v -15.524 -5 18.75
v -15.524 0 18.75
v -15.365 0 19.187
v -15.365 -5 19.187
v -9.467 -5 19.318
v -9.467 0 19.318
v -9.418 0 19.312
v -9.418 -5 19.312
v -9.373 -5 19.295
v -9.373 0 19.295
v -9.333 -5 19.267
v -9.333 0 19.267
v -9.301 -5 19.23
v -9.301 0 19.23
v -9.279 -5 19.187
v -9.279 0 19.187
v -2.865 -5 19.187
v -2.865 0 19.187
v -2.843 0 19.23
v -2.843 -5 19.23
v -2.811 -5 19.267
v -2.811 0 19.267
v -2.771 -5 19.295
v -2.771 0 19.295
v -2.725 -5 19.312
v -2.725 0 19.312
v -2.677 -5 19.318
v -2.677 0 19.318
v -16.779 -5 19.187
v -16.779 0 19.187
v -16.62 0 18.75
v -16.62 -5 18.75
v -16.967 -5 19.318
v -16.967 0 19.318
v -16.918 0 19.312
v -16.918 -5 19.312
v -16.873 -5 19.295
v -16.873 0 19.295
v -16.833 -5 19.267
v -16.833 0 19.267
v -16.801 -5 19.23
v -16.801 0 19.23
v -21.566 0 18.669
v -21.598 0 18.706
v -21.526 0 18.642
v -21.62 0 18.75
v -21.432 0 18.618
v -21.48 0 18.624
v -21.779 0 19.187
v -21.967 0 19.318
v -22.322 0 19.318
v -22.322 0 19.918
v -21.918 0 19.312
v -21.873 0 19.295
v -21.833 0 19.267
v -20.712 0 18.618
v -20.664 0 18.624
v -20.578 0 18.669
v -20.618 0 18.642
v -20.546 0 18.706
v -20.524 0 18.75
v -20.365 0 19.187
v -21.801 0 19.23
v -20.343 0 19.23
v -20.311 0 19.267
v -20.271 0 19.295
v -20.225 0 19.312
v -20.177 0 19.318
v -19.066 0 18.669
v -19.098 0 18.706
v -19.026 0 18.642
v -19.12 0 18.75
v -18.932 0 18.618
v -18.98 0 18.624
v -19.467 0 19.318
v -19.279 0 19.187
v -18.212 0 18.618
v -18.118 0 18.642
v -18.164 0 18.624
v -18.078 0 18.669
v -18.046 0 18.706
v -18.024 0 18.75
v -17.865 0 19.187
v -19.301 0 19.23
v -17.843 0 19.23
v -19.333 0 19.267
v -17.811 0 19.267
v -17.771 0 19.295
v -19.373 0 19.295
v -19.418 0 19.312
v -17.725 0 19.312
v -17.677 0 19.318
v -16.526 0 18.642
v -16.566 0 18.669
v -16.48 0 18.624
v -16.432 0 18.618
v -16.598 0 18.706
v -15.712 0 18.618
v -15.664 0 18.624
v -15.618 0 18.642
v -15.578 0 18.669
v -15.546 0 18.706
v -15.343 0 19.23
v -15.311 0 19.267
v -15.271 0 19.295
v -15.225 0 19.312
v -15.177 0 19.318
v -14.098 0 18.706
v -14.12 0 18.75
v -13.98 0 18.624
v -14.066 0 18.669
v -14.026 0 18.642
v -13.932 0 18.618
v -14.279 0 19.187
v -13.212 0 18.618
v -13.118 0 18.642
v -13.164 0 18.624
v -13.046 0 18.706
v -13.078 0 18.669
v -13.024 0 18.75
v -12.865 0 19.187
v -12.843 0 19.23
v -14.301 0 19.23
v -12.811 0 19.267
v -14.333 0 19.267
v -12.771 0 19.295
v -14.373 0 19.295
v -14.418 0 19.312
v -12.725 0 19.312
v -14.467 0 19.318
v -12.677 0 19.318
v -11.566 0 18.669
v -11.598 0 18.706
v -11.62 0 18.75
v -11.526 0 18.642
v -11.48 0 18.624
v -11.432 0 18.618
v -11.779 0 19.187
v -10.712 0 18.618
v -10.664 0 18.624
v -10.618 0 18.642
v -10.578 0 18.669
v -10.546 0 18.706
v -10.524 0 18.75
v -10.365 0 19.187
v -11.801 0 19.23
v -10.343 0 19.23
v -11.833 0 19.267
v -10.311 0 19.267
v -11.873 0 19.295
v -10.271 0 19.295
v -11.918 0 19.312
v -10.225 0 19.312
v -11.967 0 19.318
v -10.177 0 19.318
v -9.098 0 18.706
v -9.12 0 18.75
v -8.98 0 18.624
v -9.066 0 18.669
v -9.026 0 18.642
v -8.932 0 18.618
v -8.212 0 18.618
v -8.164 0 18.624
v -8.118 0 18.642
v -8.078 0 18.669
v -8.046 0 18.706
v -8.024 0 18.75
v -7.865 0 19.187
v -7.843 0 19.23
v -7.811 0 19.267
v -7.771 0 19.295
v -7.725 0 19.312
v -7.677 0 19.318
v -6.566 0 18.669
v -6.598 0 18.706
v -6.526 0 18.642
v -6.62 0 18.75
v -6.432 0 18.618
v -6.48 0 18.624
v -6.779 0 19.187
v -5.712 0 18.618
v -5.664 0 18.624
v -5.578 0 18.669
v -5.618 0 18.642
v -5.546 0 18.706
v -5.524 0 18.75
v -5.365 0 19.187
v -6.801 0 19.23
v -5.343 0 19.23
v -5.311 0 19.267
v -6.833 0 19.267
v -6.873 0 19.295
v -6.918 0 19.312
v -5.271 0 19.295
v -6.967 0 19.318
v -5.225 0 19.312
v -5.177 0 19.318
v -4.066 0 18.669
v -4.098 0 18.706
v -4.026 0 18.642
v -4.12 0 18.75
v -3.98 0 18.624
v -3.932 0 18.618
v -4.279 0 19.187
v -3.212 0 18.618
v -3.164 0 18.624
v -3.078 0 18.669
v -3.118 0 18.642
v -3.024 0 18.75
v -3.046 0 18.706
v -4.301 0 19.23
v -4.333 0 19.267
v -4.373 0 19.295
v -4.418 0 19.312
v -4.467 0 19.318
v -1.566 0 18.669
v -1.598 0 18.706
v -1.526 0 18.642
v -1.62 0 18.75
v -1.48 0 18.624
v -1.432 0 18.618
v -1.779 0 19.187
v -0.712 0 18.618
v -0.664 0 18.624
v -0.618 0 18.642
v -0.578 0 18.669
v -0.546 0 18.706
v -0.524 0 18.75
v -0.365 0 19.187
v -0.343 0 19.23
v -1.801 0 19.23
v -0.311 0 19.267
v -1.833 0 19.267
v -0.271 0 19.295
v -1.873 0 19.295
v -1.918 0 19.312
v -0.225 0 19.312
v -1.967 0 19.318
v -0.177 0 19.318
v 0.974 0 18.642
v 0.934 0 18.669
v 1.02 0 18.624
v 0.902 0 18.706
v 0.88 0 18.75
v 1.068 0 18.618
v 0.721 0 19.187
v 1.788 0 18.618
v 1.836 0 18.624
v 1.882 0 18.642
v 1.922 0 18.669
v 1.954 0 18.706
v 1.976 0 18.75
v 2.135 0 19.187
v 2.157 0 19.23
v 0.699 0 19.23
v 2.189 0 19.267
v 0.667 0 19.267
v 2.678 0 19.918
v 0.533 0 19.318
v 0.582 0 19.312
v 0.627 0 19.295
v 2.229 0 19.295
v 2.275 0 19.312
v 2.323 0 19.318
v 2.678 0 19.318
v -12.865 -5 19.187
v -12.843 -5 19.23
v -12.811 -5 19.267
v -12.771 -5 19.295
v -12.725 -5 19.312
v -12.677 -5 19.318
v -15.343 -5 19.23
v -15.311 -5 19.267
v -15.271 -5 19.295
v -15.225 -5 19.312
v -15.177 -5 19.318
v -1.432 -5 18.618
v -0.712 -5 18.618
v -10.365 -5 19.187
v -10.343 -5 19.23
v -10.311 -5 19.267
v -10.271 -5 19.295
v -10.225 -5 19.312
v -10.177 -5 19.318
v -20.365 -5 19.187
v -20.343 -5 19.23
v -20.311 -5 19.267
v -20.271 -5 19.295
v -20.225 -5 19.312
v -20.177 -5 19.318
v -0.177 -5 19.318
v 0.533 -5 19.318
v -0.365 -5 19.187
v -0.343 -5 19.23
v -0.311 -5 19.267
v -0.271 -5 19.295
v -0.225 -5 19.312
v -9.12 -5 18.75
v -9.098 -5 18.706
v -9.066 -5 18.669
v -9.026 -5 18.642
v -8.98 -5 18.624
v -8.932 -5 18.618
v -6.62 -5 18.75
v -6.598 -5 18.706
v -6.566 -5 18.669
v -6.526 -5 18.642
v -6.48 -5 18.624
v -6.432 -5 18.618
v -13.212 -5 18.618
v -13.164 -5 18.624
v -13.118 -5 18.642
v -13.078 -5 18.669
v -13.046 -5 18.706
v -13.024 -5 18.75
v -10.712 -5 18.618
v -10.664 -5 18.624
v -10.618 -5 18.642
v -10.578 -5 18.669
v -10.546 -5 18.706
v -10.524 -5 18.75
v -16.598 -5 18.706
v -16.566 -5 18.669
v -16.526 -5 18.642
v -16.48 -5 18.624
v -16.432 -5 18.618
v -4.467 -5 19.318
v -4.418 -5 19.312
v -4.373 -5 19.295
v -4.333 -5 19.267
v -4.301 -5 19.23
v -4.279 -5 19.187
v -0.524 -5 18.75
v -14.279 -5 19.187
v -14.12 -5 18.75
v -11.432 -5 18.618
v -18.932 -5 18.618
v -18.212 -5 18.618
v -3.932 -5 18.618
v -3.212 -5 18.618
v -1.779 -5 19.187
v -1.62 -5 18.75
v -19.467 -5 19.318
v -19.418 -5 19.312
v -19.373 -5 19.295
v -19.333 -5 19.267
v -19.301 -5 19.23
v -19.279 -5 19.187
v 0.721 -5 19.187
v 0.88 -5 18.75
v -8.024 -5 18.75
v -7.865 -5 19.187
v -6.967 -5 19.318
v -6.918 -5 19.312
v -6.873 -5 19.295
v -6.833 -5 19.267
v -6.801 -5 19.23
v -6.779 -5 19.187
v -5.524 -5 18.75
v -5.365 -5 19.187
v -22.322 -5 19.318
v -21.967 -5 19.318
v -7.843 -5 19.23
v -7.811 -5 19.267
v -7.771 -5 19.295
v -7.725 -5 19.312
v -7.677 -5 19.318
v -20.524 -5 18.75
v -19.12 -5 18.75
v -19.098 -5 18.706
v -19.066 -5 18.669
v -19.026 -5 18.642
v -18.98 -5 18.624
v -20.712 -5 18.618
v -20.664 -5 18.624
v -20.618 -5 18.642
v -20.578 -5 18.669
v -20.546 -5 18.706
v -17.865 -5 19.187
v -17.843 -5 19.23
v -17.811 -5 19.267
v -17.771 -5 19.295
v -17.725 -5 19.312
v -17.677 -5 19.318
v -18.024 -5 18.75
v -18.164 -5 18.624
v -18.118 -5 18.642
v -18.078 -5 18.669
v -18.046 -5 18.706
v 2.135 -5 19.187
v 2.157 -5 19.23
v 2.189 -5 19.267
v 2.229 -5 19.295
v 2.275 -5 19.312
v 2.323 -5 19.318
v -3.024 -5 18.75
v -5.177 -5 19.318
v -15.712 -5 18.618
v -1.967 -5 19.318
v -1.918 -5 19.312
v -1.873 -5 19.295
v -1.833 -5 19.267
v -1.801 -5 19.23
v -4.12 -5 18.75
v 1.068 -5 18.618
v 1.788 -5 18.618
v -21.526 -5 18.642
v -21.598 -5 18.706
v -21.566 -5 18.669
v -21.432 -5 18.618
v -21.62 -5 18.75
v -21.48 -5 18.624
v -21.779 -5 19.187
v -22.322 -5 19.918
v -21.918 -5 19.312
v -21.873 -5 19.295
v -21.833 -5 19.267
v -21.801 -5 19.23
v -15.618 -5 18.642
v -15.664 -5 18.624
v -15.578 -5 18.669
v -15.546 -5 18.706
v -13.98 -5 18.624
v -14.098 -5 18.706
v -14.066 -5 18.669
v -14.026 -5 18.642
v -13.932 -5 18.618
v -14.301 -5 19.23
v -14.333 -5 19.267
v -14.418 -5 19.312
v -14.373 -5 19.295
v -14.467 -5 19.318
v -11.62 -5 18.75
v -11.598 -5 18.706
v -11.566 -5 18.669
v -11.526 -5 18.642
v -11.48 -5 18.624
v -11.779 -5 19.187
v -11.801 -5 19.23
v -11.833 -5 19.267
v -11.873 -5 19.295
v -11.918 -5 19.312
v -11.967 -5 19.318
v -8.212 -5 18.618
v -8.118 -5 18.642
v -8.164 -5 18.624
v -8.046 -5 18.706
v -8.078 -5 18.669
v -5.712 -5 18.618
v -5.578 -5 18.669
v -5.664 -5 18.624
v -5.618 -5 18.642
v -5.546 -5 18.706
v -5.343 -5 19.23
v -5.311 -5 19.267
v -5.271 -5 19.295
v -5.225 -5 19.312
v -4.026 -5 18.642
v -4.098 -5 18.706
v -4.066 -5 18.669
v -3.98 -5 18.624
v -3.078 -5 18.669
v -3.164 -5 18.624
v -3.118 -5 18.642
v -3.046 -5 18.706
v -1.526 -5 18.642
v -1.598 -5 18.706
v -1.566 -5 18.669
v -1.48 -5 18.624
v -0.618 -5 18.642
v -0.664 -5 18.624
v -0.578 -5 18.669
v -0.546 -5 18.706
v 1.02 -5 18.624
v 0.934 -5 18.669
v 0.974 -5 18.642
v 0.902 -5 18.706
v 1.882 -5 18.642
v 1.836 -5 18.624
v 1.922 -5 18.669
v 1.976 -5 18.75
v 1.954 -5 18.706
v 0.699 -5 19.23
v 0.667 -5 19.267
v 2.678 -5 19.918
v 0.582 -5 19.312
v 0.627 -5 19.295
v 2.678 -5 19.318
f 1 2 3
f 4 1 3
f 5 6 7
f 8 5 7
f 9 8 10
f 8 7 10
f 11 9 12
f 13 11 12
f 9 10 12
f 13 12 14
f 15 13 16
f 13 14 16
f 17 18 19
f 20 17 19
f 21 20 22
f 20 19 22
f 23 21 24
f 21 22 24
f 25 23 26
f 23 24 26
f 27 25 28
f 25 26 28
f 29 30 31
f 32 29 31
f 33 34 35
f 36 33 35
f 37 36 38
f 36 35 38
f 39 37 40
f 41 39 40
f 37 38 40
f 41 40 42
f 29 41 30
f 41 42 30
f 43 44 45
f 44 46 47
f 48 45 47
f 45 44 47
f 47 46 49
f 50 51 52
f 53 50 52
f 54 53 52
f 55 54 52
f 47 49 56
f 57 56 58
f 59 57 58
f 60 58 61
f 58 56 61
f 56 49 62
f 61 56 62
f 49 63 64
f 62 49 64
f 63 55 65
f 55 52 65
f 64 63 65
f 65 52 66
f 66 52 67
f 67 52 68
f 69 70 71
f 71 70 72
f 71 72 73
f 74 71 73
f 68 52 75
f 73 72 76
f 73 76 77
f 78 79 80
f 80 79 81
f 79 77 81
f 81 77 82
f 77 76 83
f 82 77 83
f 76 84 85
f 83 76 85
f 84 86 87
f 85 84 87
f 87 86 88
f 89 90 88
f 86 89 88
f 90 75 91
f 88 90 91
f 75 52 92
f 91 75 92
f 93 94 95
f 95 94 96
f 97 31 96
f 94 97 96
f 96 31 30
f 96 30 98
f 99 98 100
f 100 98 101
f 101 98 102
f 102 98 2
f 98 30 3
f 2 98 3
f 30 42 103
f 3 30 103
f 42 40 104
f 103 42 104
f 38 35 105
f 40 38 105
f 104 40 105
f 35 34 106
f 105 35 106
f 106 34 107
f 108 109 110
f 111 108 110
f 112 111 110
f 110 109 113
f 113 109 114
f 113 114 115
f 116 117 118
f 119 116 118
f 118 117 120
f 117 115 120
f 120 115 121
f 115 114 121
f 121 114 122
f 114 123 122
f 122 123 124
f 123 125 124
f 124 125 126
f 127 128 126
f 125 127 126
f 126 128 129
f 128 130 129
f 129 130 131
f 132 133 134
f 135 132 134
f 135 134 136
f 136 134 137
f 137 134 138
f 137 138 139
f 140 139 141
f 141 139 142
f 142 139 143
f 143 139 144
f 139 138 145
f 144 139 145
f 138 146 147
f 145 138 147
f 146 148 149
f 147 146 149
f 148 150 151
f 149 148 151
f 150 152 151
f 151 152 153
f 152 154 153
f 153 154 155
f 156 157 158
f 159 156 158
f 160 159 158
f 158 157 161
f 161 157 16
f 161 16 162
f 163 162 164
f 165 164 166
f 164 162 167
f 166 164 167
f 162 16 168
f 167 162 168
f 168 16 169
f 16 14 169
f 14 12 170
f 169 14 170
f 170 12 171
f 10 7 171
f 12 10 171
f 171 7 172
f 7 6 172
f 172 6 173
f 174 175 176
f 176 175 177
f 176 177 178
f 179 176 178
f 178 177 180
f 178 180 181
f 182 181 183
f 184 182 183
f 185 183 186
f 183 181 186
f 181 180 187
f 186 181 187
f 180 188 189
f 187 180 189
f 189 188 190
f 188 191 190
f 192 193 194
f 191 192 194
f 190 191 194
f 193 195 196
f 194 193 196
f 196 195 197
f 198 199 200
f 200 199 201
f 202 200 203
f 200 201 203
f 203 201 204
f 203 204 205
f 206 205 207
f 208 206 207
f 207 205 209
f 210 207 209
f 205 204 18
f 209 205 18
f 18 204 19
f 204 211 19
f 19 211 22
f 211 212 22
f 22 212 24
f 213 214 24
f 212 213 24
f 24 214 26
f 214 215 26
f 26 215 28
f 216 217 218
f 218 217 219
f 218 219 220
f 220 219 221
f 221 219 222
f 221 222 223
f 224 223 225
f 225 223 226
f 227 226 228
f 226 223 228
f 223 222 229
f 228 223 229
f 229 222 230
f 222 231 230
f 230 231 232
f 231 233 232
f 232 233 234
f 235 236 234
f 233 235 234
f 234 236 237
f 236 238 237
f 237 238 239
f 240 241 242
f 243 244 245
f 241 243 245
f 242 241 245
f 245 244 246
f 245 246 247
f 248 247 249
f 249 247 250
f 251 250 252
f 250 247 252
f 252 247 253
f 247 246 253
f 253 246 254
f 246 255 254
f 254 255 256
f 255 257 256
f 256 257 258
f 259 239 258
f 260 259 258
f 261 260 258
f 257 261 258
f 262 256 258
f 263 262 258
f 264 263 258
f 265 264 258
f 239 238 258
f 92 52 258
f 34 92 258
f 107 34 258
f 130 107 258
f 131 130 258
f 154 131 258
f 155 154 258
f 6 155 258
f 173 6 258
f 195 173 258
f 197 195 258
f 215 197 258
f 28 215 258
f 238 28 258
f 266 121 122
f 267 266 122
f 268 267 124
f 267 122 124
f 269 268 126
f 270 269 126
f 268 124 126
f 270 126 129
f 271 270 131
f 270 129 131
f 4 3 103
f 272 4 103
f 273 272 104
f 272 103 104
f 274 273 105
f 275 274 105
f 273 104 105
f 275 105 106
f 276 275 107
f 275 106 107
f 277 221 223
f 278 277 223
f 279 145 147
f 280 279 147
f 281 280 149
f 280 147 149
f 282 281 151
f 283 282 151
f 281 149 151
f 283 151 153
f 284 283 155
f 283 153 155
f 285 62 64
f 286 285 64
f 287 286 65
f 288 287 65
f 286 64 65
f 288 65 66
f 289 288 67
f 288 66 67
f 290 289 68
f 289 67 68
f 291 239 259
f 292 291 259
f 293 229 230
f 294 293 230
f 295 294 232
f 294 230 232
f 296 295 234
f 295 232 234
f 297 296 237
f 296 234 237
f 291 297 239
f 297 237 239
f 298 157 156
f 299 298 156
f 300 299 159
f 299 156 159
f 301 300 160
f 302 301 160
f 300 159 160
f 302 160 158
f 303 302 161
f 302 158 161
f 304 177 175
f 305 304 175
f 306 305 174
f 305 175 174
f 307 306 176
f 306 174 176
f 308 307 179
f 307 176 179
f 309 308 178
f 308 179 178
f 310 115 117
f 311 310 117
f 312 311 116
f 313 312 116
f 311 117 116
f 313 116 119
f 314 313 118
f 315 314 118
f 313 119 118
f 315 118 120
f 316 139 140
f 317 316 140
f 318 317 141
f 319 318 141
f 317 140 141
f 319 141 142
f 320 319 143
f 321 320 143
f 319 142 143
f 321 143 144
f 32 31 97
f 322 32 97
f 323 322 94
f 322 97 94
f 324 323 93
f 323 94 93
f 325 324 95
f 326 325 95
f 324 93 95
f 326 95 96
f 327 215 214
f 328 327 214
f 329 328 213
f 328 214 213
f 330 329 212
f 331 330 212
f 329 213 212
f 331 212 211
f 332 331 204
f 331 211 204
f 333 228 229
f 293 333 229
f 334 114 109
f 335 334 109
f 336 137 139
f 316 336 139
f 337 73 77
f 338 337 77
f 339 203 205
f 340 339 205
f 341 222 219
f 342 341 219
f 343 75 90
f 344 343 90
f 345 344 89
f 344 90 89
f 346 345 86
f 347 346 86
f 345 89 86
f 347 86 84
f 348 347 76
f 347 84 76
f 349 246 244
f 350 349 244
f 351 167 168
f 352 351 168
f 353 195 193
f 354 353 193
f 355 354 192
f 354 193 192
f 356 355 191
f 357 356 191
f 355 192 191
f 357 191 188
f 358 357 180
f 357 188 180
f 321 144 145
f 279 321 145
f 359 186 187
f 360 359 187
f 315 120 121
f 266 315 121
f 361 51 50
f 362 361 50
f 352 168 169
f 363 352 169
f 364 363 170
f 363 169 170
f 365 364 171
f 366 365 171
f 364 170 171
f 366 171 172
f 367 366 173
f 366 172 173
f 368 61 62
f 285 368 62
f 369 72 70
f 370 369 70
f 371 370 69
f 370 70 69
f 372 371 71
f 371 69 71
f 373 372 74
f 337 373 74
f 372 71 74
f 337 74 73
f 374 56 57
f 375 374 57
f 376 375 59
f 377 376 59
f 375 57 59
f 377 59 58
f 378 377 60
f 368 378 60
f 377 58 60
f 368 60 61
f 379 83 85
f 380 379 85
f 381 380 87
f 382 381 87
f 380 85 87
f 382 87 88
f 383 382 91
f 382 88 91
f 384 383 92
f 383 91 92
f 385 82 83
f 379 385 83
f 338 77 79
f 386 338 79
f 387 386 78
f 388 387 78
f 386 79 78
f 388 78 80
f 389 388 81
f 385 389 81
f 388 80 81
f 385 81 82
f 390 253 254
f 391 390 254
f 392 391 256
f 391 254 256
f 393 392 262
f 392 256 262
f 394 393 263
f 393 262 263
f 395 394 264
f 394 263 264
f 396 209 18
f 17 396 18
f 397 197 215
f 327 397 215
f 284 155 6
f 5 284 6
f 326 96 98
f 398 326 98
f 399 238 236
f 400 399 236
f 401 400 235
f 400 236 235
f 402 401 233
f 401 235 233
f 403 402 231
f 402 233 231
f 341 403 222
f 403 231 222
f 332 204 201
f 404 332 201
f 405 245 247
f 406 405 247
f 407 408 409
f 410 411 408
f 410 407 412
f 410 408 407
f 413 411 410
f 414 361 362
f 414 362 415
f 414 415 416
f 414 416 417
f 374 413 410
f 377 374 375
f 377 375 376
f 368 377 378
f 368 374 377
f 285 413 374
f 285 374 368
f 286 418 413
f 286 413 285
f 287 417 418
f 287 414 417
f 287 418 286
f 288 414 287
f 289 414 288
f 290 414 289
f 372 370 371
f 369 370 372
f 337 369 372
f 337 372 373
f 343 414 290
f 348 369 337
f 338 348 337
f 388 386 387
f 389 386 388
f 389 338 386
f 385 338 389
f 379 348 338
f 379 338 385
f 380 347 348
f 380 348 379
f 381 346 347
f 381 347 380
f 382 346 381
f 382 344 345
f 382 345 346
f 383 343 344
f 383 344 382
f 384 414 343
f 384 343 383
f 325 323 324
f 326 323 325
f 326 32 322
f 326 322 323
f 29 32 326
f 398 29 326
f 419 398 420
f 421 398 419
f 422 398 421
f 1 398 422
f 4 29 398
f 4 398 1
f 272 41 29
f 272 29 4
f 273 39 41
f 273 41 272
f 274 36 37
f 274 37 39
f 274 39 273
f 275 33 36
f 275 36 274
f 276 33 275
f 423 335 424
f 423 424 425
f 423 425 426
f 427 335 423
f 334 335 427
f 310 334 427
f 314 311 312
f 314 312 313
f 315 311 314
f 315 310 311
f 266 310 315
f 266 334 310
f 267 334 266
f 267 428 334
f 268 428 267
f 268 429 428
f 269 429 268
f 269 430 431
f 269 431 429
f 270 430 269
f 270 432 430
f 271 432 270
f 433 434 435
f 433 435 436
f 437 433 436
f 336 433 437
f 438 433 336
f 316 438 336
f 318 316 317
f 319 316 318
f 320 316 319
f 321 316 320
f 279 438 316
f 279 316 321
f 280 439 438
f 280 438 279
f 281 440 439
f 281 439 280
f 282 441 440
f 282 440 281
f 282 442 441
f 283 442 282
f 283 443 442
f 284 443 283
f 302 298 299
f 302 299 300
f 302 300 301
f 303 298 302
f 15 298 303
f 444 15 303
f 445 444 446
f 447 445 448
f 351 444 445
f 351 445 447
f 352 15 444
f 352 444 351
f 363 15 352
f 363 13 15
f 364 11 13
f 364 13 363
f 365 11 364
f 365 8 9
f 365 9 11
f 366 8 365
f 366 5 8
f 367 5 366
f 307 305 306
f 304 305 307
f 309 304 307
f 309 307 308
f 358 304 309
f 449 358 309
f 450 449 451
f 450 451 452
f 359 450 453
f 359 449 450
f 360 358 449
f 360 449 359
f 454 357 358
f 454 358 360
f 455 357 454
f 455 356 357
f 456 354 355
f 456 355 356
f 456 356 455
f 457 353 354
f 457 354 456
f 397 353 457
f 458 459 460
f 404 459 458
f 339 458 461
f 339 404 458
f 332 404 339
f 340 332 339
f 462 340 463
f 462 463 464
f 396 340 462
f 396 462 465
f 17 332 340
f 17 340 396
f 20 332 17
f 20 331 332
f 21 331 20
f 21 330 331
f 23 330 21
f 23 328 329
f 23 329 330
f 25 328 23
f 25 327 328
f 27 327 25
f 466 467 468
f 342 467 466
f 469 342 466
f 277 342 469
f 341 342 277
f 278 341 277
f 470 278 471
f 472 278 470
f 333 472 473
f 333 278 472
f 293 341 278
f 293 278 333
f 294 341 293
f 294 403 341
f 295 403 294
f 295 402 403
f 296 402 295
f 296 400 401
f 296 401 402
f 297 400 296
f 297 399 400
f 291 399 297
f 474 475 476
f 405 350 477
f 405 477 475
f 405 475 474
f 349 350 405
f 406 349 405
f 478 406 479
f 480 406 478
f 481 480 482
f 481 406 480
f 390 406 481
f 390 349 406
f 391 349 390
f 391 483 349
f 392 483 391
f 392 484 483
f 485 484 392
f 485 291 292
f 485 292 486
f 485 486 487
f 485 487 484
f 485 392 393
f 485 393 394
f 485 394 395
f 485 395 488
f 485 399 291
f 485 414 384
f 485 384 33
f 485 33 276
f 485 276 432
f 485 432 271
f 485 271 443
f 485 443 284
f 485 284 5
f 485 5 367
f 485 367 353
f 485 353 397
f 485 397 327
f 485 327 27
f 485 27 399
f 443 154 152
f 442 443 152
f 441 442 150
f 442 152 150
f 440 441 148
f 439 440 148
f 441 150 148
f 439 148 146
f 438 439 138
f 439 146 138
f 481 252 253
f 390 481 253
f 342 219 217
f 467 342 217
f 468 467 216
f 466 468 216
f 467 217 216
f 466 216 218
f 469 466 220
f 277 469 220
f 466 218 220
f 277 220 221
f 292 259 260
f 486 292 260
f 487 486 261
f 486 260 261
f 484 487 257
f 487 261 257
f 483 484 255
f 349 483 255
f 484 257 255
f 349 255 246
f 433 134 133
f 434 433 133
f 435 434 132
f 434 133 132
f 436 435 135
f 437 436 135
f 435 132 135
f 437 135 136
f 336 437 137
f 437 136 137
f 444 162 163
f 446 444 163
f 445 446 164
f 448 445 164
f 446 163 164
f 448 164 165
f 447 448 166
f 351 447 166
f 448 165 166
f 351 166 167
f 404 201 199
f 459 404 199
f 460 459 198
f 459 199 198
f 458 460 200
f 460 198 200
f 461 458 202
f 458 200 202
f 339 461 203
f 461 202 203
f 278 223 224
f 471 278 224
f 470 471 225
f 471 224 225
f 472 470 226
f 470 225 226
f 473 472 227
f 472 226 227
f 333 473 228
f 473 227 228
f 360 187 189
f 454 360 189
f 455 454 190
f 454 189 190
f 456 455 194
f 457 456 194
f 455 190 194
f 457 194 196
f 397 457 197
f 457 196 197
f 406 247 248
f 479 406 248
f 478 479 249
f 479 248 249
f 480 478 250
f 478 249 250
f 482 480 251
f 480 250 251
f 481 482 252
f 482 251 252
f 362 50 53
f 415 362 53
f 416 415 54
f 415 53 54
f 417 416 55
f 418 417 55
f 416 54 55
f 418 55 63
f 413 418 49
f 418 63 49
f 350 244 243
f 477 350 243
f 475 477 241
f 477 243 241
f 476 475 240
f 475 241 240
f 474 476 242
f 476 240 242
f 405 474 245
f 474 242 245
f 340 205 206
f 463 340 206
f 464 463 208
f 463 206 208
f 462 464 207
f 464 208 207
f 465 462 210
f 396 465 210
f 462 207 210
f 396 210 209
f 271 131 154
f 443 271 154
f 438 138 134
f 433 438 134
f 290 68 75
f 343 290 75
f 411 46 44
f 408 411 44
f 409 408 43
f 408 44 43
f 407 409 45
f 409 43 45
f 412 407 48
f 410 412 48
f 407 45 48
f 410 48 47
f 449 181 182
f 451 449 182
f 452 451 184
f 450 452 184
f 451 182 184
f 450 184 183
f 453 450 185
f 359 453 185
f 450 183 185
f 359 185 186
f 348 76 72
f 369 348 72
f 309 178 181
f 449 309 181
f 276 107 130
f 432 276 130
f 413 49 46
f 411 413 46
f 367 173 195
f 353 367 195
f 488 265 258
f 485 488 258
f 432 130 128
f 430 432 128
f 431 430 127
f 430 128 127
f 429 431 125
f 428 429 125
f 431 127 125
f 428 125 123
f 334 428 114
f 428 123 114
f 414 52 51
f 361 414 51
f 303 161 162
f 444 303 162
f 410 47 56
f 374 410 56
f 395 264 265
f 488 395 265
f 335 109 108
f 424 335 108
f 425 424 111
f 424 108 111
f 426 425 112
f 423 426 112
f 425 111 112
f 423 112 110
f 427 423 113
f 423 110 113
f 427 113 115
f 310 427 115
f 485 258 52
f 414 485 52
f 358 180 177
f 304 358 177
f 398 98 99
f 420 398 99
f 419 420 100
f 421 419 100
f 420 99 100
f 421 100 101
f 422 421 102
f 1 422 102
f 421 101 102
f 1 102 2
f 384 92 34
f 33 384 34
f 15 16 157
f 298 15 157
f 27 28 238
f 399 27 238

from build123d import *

# Parameters (mm, degrees)
F1_DEPTH = 5


with BuildPart() as f1:
    # F0 (on Front) → F1 (new body)
    with BuildSketch(Plane.XZ):
        with BuildLine():
            Line((-19.821928, 19.918123), (-21.071928, 19.918123))
            Line((-21.071928, 19.918123), (-22.321928, 19.918123))
            Line((-22.321928, 19.918123), (-22.321928, 19.318123))
            Line((-22.321928, 19.318123), (-21.966749, 19.318123))
            ThreePointArc((-21.966749, 19.318123), (-21.852034, 19.281953), (-21.77881, 19.186527))
            Line((-21.77881, 19.186527), (-21.619825, 18.749719))
            ThreePointArc((-21.619825, 18.749719), (-21.546602, 18.654293), (-21.431887, 18.618123))
            Line((-21.431887, 18.618123), (-21.071928, 18.618123))
            Line((-21.071928, 18.618123), (-20.71197, 18.618123))
            ThreePointArc((-20.71197, 18.618123), (-20.597254, 18.654293), (-20.524031, 18.749719))
            Line((-20.524031, 18.749719), (-20.365046, 19.186527))
            ThreePointArc((-20.365046, 19.186527), (-20.291823, 19.281953), (-20.177108, 19.318123))
            Line((-20.177108, 19.318123), (-19.821928, 19.318123))
            Line((-19.821928, 19.318123), (-19.466749, 19.318123))
            ThreePointArc((-19.466749, 19.318123), (-19.352034, 19.281953), (-19.27881, 19.186527))
            Line((-19.27881, 19.186527), (-19.119825, 18.749719))
            ThreePointArc((-19.119825, 18.749719), (-19.046602, 18.654293), (-18.931887, 18.618123))
            Line((-18.931887, 18.618123), (-18.571928, 18.618123))
            Line((-18.571928, 18.618123), (-18.21197, 18.618123))
            ThreePointArc((-18.21197, 18.618123), (-18.097254, 18.654293), (-18.024031, 18.749719))
            Line((-18.024031, 18.749719), (-17.865046, 19.186527))
            ThreePointArc((-17.865046, 19.186527), (-17.791823, 19.281953), (-17.677108, 19.318123))
            Line((-17.677108, 19.318123), (-17.321928, 19.318123))
            Line((-17.321928, 19.318123), (-16.966749, 19.318123))
            ThreePointArc((-16.966749, 19.318123), (-16.852034, 19.281953), (-16.77881, 19.186527))
            Line((-16.77881, 19.186527), (-16.619825, 18.749719))
            ThreePointArc((-16.619825, 18.749719), (-16.546602, 18.654293), (-16.431887, 18.618123))
            Line((-16.431887, 18.618123), (-16.071928, 18.618123))
            Line((-16.071928, 18.618123), (-15.71197, 18.618123))
            ThreePointArc((-15.71197, 18.618123), (-15.597254, 18.654293), (-15.524031, 18.749719))
            Line((-15.524031, 18.749719), (-15.365046, 19.186527))
            ThreePointArc((-15.365046, 19.186527), (-15.291823, 19.281953), (-15.177108, 19.318123))
            Line((-15.177108, 19.318123), (-14.821928, 19.318123))
            Line((-14.821928, 19.318123), (-14.466749, 19.318123))
            ThreePointArc((-14.466749, 19.318123), (-14.352034, 19.281953), (-14.27881, 19.186527))
            Line((-14.27881, 19.186527), (-14.119825, 18.749719))
            ThreePointArc((-14.119825, 18.749719), (-14.046602, 18.654293), (-13.931887, 18.618123))
            Line((-13.931887, 18.618123), (-13.571928, 18.618123))
            Line((-13.571928, 18.618123), (-13.21197, 18.618123))
            ThreePointArc((-13.21197, 18.618123), (-13.097254, 18.654293), (-13.024031, 18.749719))
            Line((-13.024031, 18.749719), (-12.865046, 19.186527))
            ThreePointArc((-12.865046, 19.186527), (-12.791823, 19.281953), (-12.677108, 19.318123))
            Line((-12.677108, 19.318123), (-12.321928, 19.318123))
            Line((-12.321928, 19.318123), (-11.966749, 19.318123))
            ThreePointArc((-11.966749, 19.318123), (-11.852034, 19.281953), (-11.77881, 19.186527))
            Line((-11.77881, 19.186527), (-11.619825, 18.749719))
            ThreePointArc((-11.619825, 18.749719), (-11.546602, 18.654293), (-11.431887, 18.618123))
            Line((-11.431887, 18.618123), (-11.071928, 18.618123))
            Line((-11.071928, 18.618123), (-10.71197, 18.618123))
            ThreePointArc((-10.71197, 18.618123), (-10.597254, 18.654293), (-10.524031, 18.749719))
            Line((-10.524031, 18.749719), (-10.365046, 19.186527))
            ThreePointArc((-10.365046, 19.186527), (-10.291823, 19.281953), (-10.177108, 19.318123))
            Line((-10.177108, 19.318123), (-9.821928, 19.318123))
            Line((-9.821928, 19.318123), (-9.466749, 19.318123))
            ThreePointArc((-9.466749, 19.318123), (-9.352034, 19.281953), (-9.27881, 19.186527))
            Line((-9.27881, 19.186527), (-9.119825, 18.749719))
            ThreePointArc((-9.119825, 18.749719), (-9.046602, 18.654293), (-8.931887, 18.618123))
            Line((-8.931887, 18.618123), (-8.571928, 18.618123))
            Line((-8.571928, 18.618123), (-8.21197, 18.618123))
            ThreePointArc((-8.21197, 18.618123), (-8.097254, 18.654293), (-8.024031, 18.749719))
            Line((-8.024031, 18.749719), (-7.865046, 19.186527))
            ThreePointArc((-7.865046, 19.186527), (-7.791823, 19.281953), (-7.677108, 19.318123))
            Line((-7.677108, 19.318123), (-7.321928, 19.318123))
            Line((-7.321928, 19.318123), (-6.966749, 19.318123))
            ThreePointArc((-6.966749, 19.318123), (-6.852034, 19.281953), (-6.77881, 19.186527))
            Line((-6.77881, 19.186527), (-6.619825, 18.749719))
            ThreePointArc((-6.619825, 18.749719), (-6.546602, 18.654293), (-6.431887, 18.618123))
            Line((-6.431887, 18.618123), (-6.071928, 18.618123))
            Line((-6.071928, 18.618123), (-5.71197, 18.618123))
            ThreePointArc((-5.71197, 18.618123), (-5.597254, 18.654293), (-5.524031, 18.749719))
            Line((-5.524031, 18.749719), (-5.365046, 19.186527))
            ThreePointArc((-5.365046, 19.186527), (-5.291823, 19.281953), (-5.177108, 19.318123))
            Line((-5.177108, 19.318123), (-4.821928, 19.318123))
            Line((-4.821928, 19.318123), (-4.466749, 19.318123))
            ThreePointArc((-4.466749, 19.318123), (-4.352034, 19.281953), (-4.27881, 19.186527))
            Line((-4.27881, 19.186527), (-4.119825, 18.749719))
            ThreePointArc((-4.119825, 18.749719), (-4.046602, 18.654293), (-3.931887, 18.618123))
            Line((-3.931887, 18.618123), (-3.571928, 18.618123))
            Line((-3.571928, 18.618123), (-3.21197, 18.618123))
            ThreePointArc((-3.21197, 18.618123), (-3.097254, 18.654293), (-3.024031, 18.749719))
            Line((-3.024031, 18.749719), (-2.865046, 19.186527))
            ThreePointArc((-2.865046, 19.186527), (-2.791823, 19.281953), (-2.677108, 19.318123))
            Line((-2.677108, 19.318123), (-2.321928, 19.318123))
            Line((-2.321928, 19.318123), (-1.966749, 19.318123))
            ThreePointArc((-1.966749, 19.318123), (-1.852034, 19.281953), (-1.77881, 19.186527))
            Line((-1.77881, 19.186527), (-1.619825, 18.749719))
            ThreePointArc((-1.619825, 18.749719), (-1.546602, 18.654293), (-1.431887, 18.618123))
            Line((-1.431887, 18.618123), (-1.071928, 18.618123))
            Line((-1.071928, 18.618123), (-0.71197, 18.618123))
            ThreePointArc((-0.71197, 18.618123), (-0.597254, 18.654293), (-0.524031, 18.749719))
            Line((-0.524031, 18.749719), (-0.365046, 19.186527))
            ThreePointArc((-0.365046, 19.186527), (-0.291823, 19.281953), (-0.177108, 19.318123))
            Line((-0.177108, 19.318123), (0.178072, 19.318123))
            Line((0.178072, 19.318123), (0.533251, 19.318123))
            ThreePointArc((0.533251, 19.318123), (0.647966, 19.281953), (0.72119, 19.186527))
            Line((0.72119, 19.186527), (0.880175, 18.749719))
            ThreePointArc((0.880175, 18.749719), (0.953398, 18.654293), (1.068113, 18.618123))
            Line((1.068113, 18.618123), (1.428072, 18.618123))
            Line((1.428072, 18.618123), (1.78803, 18.618123))
            ThreePointArc((1.78803, 18.618123), (1.902746, 18.654293), (1.975969, 18.749719))
            Line((1.975969, 18.749719), (2.134954, 19.186527))
            ThreePointArc((2.134954, 19.186527), (2.208177, 19.281953), (2.322892, 19.318123))
            Line((2.322892, 19.318123), (2.678072, 19.318123))
            Line((2.678072, 19.318123), (2.678072, 19.918123))
            Line((2.678072, 19.918123), (1.428072, 19.918123))
            Line((1.428072, 19.918123), (0.178072, 19.918123))
            Line((0.178072, 19.918123), (-1.071928, 19.918123))
            Line((-1.071928, 19.918123), (-2.321928, 19.918123))
            Line((-2.321928, 19.918123), (-3.571928, 19.918123))
            Line((-3.571928, 19.918123), (-4.821928, 19.918123))
            Line((-4.821928, 19.918123), (-6.071928, 19.918123))
            Line((-6.071928, 19.918123), (-7.321928, 19.918123))
            Line((-7.321928, 19.918123), (-8.571928, 19.918123))
            Line((-8.571928, 19.918123), (-9.821928, 19.918123))
            Line((-9.821928, 19.918123), (-11.071928, 19.918123))
            Line((-11.071928, 19.918123), (-12.321928, 19.918123))
            Line((-12.321928, 19.918123), (-13.571928, 19.918123))
            Line((-13.571928, 19.918123), (-14.821928, 19.918123))
            Line((-14.821928, 19.918123), (-16.071928, 19.918123))
            Line((-16.071928, 19.918123), (-17.321928, 19.918123))
            Line((-17.321928, 19.918123), (-18.571928, 19.918123))
            Line((-18.571928, 19.918123), (-19.821928, 19.918123))
        make_face()
    extrude(amount=F1_DEPTH)


solid = f1.part
